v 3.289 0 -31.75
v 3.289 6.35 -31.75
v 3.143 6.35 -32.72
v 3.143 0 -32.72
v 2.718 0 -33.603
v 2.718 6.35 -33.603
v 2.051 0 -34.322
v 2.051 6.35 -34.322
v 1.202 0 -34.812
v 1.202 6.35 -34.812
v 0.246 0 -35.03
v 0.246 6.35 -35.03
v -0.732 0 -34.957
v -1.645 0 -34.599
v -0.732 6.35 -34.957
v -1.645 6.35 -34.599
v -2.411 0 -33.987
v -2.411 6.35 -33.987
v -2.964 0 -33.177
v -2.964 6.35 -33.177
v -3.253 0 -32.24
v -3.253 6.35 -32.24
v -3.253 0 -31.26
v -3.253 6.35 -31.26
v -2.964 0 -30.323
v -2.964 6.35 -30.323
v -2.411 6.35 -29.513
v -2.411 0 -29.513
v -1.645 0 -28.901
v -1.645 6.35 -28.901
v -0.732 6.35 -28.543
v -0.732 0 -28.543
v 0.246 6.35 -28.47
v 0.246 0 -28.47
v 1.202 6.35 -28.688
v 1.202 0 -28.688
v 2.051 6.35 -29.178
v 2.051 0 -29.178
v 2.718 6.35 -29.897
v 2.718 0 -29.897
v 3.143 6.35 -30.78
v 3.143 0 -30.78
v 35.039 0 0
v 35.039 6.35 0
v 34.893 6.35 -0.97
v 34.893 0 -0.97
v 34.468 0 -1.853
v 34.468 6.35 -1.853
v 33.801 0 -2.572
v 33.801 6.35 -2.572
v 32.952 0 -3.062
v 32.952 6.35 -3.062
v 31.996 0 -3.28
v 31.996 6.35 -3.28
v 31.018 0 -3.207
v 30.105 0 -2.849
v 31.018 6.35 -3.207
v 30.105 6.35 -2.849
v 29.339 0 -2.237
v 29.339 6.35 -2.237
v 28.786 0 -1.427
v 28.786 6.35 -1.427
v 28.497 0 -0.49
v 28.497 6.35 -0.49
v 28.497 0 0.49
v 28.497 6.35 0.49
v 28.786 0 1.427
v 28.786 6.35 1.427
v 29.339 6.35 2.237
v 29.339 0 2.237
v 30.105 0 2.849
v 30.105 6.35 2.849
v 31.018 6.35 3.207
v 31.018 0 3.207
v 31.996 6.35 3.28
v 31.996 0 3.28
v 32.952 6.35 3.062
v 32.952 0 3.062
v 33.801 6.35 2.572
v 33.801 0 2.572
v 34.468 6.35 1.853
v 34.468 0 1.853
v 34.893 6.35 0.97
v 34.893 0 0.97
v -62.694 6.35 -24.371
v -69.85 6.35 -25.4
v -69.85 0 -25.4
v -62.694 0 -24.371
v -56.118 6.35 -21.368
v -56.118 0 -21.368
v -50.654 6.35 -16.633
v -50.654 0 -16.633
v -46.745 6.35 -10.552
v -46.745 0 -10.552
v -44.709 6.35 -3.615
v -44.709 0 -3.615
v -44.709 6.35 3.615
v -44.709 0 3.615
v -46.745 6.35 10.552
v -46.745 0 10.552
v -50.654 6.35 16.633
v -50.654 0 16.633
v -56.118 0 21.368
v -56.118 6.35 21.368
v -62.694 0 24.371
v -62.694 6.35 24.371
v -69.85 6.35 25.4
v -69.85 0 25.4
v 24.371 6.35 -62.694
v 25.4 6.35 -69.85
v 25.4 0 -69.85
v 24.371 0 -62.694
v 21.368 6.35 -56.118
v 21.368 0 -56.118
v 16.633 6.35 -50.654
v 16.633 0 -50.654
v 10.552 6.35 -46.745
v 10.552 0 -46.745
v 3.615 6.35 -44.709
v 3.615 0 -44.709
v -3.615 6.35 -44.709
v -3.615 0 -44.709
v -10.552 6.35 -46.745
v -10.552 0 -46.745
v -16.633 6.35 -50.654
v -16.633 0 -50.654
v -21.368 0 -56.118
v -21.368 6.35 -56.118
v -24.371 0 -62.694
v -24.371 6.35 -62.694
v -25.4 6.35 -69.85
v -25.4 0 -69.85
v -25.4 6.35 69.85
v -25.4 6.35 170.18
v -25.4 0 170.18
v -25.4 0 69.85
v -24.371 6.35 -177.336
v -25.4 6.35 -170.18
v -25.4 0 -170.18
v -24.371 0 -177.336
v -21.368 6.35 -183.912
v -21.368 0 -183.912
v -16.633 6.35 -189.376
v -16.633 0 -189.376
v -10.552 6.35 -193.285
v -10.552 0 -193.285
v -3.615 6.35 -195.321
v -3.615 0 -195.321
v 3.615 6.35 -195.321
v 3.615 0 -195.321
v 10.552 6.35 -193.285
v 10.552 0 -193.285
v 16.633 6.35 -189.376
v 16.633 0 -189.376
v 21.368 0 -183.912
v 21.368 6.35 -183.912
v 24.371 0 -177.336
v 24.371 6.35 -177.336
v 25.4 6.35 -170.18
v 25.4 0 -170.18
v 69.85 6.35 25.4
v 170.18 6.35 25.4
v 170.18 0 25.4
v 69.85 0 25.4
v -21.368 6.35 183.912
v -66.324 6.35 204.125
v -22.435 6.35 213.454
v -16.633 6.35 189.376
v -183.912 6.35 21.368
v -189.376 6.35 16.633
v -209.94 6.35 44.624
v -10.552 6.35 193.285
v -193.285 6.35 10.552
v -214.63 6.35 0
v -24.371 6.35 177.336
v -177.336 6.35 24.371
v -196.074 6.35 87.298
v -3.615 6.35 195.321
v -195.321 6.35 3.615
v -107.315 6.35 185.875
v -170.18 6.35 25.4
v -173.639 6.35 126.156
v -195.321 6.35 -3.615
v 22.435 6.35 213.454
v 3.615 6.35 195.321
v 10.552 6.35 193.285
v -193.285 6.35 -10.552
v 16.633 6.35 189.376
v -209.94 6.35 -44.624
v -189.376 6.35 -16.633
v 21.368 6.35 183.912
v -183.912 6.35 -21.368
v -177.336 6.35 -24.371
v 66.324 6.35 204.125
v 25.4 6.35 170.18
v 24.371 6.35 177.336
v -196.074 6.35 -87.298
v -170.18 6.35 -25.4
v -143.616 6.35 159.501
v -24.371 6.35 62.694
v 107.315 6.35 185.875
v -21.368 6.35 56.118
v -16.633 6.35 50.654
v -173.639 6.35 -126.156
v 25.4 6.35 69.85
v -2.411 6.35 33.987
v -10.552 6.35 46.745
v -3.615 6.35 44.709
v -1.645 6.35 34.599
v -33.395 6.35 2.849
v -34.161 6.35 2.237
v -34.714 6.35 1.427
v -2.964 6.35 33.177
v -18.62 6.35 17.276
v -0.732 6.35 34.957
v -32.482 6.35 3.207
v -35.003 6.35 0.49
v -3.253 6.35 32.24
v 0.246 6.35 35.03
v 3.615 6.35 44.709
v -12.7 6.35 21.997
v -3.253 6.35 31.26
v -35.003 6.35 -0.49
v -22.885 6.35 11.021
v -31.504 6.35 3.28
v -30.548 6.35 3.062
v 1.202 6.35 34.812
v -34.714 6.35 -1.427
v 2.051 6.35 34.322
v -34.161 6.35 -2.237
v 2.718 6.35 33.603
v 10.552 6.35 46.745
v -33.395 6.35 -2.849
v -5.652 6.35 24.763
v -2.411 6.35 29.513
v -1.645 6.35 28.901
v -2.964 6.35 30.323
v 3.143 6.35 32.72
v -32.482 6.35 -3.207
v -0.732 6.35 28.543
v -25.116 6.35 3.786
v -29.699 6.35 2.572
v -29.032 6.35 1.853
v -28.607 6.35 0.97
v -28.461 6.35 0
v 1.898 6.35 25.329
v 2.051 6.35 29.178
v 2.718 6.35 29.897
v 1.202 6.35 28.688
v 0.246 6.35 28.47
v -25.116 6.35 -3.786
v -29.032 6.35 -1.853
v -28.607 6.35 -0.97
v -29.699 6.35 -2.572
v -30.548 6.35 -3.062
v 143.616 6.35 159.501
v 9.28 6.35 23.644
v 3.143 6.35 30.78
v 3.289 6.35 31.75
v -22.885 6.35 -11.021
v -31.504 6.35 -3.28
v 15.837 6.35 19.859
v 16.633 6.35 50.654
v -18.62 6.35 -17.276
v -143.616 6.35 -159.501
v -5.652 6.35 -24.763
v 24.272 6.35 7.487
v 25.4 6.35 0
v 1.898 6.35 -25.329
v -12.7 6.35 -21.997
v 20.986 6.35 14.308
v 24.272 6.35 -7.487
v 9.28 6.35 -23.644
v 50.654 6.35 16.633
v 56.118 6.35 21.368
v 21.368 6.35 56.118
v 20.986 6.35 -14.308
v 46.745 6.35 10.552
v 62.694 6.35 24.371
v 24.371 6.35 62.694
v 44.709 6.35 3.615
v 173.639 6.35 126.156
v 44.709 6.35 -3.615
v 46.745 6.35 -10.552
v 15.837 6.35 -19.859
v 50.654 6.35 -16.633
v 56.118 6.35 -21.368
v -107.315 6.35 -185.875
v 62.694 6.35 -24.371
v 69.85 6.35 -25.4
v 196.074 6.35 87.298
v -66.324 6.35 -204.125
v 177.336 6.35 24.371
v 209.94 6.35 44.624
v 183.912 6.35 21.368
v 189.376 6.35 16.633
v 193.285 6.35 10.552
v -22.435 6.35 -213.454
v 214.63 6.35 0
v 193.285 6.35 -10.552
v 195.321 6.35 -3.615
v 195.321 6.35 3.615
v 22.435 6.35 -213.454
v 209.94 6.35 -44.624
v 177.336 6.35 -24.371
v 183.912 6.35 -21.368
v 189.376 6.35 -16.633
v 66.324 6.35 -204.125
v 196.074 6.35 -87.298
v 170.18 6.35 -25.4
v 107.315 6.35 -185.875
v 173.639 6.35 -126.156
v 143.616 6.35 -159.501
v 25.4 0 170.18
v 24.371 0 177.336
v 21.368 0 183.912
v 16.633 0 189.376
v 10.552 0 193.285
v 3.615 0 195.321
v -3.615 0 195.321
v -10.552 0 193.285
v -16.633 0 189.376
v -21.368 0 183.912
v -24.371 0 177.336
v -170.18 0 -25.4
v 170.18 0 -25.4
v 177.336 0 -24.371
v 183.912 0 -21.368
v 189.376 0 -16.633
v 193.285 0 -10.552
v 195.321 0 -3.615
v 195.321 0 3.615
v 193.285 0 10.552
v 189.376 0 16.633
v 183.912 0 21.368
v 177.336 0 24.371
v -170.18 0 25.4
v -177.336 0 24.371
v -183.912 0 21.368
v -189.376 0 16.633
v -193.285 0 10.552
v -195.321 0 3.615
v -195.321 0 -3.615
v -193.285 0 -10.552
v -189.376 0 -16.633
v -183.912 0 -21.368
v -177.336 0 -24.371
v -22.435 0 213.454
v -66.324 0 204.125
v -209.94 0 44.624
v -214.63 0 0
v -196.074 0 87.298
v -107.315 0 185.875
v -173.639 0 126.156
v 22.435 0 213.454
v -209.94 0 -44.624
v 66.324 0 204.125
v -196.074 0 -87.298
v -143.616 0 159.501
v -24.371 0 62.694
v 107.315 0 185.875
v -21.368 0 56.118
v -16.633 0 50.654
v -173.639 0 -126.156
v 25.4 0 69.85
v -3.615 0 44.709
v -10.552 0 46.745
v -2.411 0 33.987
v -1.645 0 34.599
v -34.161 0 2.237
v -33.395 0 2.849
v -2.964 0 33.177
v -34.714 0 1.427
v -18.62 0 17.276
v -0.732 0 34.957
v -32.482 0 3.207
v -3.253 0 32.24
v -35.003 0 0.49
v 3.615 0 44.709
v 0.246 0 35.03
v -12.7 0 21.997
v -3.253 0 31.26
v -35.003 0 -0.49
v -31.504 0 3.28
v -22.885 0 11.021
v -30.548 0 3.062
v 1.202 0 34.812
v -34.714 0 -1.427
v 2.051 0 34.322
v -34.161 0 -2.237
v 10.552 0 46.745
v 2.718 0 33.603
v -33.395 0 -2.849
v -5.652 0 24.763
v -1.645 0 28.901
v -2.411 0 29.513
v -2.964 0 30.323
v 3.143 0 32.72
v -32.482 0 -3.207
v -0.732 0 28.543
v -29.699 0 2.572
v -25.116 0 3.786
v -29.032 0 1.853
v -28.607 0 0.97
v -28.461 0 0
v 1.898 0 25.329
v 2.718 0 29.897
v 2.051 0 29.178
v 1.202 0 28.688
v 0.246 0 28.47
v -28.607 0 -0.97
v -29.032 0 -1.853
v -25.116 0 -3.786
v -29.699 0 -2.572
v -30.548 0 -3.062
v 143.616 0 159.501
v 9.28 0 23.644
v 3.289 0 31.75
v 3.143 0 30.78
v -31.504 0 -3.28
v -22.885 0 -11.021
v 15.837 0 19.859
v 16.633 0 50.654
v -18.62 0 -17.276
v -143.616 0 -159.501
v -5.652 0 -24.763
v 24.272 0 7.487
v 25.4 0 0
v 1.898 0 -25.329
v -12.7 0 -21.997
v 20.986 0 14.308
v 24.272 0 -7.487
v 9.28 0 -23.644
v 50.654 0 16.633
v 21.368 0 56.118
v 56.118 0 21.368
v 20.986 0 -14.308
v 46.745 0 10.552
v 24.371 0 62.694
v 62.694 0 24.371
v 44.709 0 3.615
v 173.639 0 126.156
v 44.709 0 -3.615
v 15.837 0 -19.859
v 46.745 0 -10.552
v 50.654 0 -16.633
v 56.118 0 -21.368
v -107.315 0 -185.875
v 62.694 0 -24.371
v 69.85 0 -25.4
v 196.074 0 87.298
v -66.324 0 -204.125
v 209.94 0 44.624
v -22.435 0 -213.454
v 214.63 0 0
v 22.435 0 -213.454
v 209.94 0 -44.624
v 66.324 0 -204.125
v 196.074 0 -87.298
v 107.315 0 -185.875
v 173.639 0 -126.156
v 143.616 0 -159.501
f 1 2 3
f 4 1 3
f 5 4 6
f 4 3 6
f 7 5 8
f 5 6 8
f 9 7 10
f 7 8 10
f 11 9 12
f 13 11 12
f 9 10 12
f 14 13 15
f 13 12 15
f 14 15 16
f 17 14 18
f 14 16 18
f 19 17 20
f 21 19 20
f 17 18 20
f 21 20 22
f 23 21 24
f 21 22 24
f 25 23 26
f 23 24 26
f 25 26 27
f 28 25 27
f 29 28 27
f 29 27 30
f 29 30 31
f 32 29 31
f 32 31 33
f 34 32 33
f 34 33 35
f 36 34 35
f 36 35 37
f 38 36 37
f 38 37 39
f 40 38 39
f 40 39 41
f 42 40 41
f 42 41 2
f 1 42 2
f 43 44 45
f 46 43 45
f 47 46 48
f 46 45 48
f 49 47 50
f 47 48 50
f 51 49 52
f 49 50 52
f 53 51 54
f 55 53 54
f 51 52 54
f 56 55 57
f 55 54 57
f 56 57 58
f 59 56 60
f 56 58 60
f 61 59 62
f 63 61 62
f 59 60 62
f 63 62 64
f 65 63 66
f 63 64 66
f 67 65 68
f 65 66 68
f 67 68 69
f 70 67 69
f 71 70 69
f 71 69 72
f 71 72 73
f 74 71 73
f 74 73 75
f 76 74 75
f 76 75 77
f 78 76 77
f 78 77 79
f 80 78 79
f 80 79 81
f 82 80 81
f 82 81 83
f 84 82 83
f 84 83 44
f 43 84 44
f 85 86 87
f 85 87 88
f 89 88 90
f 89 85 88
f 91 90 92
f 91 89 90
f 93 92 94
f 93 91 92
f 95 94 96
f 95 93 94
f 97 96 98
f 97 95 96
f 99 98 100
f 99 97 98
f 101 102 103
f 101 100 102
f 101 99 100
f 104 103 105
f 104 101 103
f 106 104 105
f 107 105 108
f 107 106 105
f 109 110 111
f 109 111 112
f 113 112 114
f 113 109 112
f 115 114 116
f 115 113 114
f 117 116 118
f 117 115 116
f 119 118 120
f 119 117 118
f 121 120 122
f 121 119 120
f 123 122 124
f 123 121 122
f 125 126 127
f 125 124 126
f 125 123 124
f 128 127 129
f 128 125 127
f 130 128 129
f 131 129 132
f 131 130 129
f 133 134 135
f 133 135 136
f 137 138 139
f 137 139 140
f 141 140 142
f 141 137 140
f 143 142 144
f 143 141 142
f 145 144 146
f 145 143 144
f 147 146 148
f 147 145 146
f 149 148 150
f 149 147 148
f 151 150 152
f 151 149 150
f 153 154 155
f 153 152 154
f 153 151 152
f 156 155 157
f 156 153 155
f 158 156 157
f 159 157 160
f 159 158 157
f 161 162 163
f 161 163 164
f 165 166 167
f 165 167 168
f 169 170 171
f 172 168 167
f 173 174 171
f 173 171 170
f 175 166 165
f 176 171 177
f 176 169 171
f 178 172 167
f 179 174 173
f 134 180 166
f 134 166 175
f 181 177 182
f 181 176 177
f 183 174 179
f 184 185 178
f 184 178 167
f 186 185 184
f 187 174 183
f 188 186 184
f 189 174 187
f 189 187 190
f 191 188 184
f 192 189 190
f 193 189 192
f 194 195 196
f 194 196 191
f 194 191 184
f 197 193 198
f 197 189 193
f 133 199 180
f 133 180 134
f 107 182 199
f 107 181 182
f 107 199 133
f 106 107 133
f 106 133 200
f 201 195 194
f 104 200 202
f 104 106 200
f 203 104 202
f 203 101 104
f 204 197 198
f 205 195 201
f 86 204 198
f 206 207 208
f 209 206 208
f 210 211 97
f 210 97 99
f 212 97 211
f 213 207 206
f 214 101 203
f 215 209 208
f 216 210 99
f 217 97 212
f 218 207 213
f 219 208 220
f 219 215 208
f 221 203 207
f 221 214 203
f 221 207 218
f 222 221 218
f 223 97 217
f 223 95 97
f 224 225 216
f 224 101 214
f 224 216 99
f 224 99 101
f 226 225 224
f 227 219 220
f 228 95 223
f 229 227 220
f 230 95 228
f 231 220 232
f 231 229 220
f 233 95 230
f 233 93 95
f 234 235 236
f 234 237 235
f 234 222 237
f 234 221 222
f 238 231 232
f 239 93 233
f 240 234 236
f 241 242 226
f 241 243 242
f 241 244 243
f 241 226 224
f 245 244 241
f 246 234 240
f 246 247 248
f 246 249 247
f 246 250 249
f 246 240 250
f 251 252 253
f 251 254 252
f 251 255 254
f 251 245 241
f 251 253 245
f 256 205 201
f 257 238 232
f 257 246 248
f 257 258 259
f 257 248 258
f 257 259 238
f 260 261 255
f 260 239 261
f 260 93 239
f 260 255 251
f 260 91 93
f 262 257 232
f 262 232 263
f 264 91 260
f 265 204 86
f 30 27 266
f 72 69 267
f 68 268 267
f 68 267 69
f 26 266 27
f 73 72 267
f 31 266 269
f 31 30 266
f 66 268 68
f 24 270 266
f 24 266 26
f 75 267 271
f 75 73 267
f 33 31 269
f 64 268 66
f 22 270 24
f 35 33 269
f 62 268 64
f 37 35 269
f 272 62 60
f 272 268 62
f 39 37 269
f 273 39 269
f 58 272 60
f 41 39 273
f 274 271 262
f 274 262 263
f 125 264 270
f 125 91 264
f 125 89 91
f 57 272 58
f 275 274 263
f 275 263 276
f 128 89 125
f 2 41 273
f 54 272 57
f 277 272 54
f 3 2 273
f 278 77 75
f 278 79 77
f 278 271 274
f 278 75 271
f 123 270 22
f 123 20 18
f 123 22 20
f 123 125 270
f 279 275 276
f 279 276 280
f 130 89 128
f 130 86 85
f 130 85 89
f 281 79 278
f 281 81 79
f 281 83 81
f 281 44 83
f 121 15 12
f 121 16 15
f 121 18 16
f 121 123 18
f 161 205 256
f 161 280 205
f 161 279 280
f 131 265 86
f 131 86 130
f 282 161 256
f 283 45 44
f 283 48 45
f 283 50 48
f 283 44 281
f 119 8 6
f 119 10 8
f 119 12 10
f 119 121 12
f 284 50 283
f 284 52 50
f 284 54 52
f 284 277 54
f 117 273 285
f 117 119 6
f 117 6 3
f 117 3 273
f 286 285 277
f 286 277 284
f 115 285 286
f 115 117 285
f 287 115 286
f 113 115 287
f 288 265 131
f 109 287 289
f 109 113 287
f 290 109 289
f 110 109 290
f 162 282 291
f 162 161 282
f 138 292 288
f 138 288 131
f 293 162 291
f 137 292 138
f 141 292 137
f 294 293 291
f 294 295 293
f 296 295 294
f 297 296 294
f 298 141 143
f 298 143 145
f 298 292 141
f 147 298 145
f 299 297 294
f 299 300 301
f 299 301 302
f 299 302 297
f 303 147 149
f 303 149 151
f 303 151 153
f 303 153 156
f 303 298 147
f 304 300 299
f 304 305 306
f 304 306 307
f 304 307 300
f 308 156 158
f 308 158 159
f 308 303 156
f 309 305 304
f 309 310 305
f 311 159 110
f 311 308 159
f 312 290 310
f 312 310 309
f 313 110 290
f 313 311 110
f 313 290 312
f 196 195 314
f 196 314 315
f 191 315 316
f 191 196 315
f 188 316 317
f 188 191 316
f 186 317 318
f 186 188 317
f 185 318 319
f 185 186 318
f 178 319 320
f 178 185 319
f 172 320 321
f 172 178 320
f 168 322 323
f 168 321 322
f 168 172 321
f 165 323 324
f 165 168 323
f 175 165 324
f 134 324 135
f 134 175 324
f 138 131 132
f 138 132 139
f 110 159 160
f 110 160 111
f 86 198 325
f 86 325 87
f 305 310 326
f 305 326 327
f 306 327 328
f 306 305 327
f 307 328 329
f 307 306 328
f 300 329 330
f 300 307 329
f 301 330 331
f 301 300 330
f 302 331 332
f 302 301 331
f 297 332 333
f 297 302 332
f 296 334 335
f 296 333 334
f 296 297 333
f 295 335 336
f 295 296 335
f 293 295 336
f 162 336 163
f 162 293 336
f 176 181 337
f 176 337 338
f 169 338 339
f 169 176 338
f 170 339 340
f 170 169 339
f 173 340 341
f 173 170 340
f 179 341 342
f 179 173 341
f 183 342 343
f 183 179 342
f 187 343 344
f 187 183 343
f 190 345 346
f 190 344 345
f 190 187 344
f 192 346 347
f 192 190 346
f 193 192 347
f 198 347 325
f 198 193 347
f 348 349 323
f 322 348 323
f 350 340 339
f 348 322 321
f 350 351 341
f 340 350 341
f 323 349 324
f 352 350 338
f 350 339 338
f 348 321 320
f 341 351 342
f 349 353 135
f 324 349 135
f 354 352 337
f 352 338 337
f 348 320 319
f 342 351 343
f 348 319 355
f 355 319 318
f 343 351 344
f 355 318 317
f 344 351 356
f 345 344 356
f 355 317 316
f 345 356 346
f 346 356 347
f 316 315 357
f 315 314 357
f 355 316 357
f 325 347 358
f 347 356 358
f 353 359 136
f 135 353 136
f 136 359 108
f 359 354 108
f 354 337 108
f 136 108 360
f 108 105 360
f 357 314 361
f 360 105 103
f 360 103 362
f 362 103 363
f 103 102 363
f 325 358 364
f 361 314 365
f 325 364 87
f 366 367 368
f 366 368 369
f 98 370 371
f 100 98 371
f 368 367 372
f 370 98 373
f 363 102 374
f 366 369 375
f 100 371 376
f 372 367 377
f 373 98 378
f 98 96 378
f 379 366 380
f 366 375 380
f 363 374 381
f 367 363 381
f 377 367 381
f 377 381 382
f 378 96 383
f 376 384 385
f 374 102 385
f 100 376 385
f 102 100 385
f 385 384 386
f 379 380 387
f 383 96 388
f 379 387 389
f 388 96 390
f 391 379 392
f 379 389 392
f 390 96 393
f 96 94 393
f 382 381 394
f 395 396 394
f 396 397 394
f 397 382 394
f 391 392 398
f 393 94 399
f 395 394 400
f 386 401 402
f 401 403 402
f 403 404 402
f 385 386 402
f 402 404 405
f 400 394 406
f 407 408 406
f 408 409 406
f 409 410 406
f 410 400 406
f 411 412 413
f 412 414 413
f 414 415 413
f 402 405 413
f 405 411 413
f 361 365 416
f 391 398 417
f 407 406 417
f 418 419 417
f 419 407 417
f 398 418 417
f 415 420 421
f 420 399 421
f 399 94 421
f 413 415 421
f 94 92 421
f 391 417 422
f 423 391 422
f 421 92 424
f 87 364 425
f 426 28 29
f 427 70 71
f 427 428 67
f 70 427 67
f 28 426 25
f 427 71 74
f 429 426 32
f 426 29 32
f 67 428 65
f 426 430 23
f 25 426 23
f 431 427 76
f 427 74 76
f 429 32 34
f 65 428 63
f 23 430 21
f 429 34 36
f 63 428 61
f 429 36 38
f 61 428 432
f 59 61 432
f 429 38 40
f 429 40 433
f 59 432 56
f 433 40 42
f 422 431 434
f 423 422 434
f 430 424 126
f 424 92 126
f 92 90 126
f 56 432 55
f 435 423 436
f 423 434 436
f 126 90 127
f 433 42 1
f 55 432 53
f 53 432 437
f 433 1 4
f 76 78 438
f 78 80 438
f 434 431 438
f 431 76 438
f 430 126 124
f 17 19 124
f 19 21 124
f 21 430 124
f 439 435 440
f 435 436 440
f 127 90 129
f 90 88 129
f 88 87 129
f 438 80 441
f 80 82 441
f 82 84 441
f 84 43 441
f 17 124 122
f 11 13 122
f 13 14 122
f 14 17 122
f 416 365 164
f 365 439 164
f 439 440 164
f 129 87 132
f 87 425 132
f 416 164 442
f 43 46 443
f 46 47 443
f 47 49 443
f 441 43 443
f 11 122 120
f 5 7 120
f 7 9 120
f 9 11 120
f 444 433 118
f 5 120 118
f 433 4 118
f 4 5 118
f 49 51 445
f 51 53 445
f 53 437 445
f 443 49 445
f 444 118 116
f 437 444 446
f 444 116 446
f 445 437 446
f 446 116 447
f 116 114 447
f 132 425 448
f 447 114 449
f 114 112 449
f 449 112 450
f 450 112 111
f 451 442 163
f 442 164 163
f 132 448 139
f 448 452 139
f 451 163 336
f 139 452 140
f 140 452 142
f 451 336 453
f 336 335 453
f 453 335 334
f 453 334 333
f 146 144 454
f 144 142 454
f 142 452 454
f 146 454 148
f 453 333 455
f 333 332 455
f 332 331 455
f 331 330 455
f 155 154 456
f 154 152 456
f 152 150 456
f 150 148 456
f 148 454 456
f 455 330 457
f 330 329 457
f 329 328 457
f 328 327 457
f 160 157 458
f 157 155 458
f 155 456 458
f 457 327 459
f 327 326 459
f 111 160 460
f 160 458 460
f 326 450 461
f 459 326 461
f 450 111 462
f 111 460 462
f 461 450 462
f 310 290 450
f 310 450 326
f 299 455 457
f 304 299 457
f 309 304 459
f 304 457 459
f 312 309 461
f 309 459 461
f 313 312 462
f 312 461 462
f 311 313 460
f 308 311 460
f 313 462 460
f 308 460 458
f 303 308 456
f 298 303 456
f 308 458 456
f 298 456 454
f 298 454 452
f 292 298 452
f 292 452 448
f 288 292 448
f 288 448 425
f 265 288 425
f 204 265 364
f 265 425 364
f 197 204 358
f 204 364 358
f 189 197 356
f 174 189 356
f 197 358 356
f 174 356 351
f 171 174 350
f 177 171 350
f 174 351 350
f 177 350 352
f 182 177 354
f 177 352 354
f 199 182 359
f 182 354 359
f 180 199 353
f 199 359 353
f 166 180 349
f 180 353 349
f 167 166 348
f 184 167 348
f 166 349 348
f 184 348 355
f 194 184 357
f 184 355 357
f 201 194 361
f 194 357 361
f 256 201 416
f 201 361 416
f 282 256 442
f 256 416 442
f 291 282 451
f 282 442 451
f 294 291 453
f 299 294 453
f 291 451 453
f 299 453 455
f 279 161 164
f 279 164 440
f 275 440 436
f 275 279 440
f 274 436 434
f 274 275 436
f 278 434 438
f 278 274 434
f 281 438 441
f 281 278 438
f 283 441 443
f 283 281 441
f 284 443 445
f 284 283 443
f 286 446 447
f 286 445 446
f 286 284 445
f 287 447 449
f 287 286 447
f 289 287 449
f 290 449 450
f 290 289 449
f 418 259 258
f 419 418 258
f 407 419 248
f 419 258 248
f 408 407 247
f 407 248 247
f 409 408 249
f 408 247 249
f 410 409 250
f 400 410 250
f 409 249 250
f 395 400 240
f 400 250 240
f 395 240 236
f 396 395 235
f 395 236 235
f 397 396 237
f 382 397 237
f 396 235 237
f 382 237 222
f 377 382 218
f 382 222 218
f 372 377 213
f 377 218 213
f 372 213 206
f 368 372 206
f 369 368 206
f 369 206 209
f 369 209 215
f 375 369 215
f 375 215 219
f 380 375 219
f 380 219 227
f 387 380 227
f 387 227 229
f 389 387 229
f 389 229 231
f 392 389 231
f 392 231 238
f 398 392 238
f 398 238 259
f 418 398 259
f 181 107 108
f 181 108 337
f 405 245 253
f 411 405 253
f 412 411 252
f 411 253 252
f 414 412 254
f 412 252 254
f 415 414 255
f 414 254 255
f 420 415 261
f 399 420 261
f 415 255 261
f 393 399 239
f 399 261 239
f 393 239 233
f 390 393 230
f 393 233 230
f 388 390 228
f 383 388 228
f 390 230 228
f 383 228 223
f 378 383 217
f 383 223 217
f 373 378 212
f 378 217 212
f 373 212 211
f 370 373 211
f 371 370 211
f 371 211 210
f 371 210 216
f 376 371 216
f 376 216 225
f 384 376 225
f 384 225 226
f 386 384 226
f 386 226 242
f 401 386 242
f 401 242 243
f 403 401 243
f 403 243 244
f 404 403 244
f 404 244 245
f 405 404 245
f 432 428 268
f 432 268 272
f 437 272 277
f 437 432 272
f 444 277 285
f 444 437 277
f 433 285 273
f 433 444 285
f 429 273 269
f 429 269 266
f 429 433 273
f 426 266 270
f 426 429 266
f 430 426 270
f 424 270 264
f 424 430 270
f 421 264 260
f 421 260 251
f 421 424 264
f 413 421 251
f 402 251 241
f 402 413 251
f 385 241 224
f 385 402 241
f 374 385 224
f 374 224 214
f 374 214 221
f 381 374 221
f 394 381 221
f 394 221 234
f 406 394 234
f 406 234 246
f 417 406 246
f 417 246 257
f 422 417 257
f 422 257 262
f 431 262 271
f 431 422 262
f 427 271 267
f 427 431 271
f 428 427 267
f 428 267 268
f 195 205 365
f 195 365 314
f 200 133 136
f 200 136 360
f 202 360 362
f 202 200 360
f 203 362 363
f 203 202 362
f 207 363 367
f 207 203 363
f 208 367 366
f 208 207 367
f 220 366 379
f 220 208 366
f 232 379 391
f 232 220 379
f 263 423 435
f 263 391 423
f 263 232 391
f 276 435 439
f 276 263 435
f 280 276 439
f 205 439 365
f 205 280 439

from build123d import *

# Parameters (mm, degrees)
SKETCH1_R           = 214.63
SKETCH1_R_2         = 25.4
BOSS_EXTRUDE1_DEPTH = 6.35
SKETCH3_R           = 3.2893
CUT_EXTRUDE2_DEPTH  = 7.35
CUT_EXTRUDE3_DEPTH  = 7.35


with BuildPart() as part:
    # Sketch1 → Boss-Extrude1 (new body)
    with BuildSketch(Plane(origin=(0, 0, 0), x_dir=(1, 0, 0), z_dir=(0, 1, 0))):
        Circle(SKETCH1_R)
        Circle(SKETCH1_R_2, mode=Mode.SUBTRACT)
    extrude(amount=BOSS_EXTRUDE1_DEPTH)

    # Sketch3 → Cut-Extrude2 (cut, through all)
    with BuildSketch(Plane(origin=(0, 6.35, 0), x_dir=(1, 0, 0), z_dir=(0, 1, 0))):
        with Locations((0, 31.75)):
            Circle(SKETCH3_R)
        with Locations((31.75, 0)):
            Circle(SKETCH3_R)
        with Locations((0, -31.75)):
            Circle(SKETCH3_R)
        with Locations((-31.75, 0)):
            Circle(SKETCH3_R)
    extrude(amount=-CUT_EXTRUDE2_DEPTH, mode=Mode.SUBTRACT)

    # Sketch4 → Cut-Extrude3 (cut, through all)
    with BuildSketch(Plane(origin=(0, 6.35, 0), x_dir=(1, 0, 0), z_dir=(0, 1, 0))):
        with BuildLine():
            Line((25.4, 170.18), (25.4, 69.85))
            ThreePointArc((25.4, 69.85), (0, 44.45), (-25.4, 69.85))
            Line((-25.4, 69.85), (-25.4, 170.18))
            ThreePointArc((-25.4, 170.18), (0, 195.58), (25.4, 170.18))
        make_face()
        with BuildLine():
            Line((170.18, -25.4), (69.85, -25.4))
            ThreePointArc((69.85, -25.4), (44.45, 0), (69.85, 25.4))
            Line((69.85, 25.4), (170.18, 25.4))
            ThreePointArc((170.18, 25.4), (195.58, 0), (170.18, -25.4))
        make_face()
        with BuildLine():
            Line((-25.4, -170.18), (-25.4, -69.85))
            ThreePointArc((-25.4, -69.85), (0, -44.45), (25.4, -69.85))
            Line((25.4, -69.85), (25.4, -170.18))
            ThreePointArc((25.4, -170.18), (0, -195.58), (-25.4, -170.18))
        make_face()
        with BuildLine():
            Line((-170.18, 25.4), (-69.85, 25.4))
            ThreePointArc((-69.85, 25.4), (-44.45, 0), (-69.85, -25.4))
            Line((-69.85, -25.4), (-170.18, -25.4))
            ThreePointArc((-170.18, -25.4), (-195.58, 0), (-170.18, 25.4))
        make_face()
    extrude(amount=-CUT_EXTRUDE3_DEPTH, mode=Mode.SUBTRACT)


solid = part.part
